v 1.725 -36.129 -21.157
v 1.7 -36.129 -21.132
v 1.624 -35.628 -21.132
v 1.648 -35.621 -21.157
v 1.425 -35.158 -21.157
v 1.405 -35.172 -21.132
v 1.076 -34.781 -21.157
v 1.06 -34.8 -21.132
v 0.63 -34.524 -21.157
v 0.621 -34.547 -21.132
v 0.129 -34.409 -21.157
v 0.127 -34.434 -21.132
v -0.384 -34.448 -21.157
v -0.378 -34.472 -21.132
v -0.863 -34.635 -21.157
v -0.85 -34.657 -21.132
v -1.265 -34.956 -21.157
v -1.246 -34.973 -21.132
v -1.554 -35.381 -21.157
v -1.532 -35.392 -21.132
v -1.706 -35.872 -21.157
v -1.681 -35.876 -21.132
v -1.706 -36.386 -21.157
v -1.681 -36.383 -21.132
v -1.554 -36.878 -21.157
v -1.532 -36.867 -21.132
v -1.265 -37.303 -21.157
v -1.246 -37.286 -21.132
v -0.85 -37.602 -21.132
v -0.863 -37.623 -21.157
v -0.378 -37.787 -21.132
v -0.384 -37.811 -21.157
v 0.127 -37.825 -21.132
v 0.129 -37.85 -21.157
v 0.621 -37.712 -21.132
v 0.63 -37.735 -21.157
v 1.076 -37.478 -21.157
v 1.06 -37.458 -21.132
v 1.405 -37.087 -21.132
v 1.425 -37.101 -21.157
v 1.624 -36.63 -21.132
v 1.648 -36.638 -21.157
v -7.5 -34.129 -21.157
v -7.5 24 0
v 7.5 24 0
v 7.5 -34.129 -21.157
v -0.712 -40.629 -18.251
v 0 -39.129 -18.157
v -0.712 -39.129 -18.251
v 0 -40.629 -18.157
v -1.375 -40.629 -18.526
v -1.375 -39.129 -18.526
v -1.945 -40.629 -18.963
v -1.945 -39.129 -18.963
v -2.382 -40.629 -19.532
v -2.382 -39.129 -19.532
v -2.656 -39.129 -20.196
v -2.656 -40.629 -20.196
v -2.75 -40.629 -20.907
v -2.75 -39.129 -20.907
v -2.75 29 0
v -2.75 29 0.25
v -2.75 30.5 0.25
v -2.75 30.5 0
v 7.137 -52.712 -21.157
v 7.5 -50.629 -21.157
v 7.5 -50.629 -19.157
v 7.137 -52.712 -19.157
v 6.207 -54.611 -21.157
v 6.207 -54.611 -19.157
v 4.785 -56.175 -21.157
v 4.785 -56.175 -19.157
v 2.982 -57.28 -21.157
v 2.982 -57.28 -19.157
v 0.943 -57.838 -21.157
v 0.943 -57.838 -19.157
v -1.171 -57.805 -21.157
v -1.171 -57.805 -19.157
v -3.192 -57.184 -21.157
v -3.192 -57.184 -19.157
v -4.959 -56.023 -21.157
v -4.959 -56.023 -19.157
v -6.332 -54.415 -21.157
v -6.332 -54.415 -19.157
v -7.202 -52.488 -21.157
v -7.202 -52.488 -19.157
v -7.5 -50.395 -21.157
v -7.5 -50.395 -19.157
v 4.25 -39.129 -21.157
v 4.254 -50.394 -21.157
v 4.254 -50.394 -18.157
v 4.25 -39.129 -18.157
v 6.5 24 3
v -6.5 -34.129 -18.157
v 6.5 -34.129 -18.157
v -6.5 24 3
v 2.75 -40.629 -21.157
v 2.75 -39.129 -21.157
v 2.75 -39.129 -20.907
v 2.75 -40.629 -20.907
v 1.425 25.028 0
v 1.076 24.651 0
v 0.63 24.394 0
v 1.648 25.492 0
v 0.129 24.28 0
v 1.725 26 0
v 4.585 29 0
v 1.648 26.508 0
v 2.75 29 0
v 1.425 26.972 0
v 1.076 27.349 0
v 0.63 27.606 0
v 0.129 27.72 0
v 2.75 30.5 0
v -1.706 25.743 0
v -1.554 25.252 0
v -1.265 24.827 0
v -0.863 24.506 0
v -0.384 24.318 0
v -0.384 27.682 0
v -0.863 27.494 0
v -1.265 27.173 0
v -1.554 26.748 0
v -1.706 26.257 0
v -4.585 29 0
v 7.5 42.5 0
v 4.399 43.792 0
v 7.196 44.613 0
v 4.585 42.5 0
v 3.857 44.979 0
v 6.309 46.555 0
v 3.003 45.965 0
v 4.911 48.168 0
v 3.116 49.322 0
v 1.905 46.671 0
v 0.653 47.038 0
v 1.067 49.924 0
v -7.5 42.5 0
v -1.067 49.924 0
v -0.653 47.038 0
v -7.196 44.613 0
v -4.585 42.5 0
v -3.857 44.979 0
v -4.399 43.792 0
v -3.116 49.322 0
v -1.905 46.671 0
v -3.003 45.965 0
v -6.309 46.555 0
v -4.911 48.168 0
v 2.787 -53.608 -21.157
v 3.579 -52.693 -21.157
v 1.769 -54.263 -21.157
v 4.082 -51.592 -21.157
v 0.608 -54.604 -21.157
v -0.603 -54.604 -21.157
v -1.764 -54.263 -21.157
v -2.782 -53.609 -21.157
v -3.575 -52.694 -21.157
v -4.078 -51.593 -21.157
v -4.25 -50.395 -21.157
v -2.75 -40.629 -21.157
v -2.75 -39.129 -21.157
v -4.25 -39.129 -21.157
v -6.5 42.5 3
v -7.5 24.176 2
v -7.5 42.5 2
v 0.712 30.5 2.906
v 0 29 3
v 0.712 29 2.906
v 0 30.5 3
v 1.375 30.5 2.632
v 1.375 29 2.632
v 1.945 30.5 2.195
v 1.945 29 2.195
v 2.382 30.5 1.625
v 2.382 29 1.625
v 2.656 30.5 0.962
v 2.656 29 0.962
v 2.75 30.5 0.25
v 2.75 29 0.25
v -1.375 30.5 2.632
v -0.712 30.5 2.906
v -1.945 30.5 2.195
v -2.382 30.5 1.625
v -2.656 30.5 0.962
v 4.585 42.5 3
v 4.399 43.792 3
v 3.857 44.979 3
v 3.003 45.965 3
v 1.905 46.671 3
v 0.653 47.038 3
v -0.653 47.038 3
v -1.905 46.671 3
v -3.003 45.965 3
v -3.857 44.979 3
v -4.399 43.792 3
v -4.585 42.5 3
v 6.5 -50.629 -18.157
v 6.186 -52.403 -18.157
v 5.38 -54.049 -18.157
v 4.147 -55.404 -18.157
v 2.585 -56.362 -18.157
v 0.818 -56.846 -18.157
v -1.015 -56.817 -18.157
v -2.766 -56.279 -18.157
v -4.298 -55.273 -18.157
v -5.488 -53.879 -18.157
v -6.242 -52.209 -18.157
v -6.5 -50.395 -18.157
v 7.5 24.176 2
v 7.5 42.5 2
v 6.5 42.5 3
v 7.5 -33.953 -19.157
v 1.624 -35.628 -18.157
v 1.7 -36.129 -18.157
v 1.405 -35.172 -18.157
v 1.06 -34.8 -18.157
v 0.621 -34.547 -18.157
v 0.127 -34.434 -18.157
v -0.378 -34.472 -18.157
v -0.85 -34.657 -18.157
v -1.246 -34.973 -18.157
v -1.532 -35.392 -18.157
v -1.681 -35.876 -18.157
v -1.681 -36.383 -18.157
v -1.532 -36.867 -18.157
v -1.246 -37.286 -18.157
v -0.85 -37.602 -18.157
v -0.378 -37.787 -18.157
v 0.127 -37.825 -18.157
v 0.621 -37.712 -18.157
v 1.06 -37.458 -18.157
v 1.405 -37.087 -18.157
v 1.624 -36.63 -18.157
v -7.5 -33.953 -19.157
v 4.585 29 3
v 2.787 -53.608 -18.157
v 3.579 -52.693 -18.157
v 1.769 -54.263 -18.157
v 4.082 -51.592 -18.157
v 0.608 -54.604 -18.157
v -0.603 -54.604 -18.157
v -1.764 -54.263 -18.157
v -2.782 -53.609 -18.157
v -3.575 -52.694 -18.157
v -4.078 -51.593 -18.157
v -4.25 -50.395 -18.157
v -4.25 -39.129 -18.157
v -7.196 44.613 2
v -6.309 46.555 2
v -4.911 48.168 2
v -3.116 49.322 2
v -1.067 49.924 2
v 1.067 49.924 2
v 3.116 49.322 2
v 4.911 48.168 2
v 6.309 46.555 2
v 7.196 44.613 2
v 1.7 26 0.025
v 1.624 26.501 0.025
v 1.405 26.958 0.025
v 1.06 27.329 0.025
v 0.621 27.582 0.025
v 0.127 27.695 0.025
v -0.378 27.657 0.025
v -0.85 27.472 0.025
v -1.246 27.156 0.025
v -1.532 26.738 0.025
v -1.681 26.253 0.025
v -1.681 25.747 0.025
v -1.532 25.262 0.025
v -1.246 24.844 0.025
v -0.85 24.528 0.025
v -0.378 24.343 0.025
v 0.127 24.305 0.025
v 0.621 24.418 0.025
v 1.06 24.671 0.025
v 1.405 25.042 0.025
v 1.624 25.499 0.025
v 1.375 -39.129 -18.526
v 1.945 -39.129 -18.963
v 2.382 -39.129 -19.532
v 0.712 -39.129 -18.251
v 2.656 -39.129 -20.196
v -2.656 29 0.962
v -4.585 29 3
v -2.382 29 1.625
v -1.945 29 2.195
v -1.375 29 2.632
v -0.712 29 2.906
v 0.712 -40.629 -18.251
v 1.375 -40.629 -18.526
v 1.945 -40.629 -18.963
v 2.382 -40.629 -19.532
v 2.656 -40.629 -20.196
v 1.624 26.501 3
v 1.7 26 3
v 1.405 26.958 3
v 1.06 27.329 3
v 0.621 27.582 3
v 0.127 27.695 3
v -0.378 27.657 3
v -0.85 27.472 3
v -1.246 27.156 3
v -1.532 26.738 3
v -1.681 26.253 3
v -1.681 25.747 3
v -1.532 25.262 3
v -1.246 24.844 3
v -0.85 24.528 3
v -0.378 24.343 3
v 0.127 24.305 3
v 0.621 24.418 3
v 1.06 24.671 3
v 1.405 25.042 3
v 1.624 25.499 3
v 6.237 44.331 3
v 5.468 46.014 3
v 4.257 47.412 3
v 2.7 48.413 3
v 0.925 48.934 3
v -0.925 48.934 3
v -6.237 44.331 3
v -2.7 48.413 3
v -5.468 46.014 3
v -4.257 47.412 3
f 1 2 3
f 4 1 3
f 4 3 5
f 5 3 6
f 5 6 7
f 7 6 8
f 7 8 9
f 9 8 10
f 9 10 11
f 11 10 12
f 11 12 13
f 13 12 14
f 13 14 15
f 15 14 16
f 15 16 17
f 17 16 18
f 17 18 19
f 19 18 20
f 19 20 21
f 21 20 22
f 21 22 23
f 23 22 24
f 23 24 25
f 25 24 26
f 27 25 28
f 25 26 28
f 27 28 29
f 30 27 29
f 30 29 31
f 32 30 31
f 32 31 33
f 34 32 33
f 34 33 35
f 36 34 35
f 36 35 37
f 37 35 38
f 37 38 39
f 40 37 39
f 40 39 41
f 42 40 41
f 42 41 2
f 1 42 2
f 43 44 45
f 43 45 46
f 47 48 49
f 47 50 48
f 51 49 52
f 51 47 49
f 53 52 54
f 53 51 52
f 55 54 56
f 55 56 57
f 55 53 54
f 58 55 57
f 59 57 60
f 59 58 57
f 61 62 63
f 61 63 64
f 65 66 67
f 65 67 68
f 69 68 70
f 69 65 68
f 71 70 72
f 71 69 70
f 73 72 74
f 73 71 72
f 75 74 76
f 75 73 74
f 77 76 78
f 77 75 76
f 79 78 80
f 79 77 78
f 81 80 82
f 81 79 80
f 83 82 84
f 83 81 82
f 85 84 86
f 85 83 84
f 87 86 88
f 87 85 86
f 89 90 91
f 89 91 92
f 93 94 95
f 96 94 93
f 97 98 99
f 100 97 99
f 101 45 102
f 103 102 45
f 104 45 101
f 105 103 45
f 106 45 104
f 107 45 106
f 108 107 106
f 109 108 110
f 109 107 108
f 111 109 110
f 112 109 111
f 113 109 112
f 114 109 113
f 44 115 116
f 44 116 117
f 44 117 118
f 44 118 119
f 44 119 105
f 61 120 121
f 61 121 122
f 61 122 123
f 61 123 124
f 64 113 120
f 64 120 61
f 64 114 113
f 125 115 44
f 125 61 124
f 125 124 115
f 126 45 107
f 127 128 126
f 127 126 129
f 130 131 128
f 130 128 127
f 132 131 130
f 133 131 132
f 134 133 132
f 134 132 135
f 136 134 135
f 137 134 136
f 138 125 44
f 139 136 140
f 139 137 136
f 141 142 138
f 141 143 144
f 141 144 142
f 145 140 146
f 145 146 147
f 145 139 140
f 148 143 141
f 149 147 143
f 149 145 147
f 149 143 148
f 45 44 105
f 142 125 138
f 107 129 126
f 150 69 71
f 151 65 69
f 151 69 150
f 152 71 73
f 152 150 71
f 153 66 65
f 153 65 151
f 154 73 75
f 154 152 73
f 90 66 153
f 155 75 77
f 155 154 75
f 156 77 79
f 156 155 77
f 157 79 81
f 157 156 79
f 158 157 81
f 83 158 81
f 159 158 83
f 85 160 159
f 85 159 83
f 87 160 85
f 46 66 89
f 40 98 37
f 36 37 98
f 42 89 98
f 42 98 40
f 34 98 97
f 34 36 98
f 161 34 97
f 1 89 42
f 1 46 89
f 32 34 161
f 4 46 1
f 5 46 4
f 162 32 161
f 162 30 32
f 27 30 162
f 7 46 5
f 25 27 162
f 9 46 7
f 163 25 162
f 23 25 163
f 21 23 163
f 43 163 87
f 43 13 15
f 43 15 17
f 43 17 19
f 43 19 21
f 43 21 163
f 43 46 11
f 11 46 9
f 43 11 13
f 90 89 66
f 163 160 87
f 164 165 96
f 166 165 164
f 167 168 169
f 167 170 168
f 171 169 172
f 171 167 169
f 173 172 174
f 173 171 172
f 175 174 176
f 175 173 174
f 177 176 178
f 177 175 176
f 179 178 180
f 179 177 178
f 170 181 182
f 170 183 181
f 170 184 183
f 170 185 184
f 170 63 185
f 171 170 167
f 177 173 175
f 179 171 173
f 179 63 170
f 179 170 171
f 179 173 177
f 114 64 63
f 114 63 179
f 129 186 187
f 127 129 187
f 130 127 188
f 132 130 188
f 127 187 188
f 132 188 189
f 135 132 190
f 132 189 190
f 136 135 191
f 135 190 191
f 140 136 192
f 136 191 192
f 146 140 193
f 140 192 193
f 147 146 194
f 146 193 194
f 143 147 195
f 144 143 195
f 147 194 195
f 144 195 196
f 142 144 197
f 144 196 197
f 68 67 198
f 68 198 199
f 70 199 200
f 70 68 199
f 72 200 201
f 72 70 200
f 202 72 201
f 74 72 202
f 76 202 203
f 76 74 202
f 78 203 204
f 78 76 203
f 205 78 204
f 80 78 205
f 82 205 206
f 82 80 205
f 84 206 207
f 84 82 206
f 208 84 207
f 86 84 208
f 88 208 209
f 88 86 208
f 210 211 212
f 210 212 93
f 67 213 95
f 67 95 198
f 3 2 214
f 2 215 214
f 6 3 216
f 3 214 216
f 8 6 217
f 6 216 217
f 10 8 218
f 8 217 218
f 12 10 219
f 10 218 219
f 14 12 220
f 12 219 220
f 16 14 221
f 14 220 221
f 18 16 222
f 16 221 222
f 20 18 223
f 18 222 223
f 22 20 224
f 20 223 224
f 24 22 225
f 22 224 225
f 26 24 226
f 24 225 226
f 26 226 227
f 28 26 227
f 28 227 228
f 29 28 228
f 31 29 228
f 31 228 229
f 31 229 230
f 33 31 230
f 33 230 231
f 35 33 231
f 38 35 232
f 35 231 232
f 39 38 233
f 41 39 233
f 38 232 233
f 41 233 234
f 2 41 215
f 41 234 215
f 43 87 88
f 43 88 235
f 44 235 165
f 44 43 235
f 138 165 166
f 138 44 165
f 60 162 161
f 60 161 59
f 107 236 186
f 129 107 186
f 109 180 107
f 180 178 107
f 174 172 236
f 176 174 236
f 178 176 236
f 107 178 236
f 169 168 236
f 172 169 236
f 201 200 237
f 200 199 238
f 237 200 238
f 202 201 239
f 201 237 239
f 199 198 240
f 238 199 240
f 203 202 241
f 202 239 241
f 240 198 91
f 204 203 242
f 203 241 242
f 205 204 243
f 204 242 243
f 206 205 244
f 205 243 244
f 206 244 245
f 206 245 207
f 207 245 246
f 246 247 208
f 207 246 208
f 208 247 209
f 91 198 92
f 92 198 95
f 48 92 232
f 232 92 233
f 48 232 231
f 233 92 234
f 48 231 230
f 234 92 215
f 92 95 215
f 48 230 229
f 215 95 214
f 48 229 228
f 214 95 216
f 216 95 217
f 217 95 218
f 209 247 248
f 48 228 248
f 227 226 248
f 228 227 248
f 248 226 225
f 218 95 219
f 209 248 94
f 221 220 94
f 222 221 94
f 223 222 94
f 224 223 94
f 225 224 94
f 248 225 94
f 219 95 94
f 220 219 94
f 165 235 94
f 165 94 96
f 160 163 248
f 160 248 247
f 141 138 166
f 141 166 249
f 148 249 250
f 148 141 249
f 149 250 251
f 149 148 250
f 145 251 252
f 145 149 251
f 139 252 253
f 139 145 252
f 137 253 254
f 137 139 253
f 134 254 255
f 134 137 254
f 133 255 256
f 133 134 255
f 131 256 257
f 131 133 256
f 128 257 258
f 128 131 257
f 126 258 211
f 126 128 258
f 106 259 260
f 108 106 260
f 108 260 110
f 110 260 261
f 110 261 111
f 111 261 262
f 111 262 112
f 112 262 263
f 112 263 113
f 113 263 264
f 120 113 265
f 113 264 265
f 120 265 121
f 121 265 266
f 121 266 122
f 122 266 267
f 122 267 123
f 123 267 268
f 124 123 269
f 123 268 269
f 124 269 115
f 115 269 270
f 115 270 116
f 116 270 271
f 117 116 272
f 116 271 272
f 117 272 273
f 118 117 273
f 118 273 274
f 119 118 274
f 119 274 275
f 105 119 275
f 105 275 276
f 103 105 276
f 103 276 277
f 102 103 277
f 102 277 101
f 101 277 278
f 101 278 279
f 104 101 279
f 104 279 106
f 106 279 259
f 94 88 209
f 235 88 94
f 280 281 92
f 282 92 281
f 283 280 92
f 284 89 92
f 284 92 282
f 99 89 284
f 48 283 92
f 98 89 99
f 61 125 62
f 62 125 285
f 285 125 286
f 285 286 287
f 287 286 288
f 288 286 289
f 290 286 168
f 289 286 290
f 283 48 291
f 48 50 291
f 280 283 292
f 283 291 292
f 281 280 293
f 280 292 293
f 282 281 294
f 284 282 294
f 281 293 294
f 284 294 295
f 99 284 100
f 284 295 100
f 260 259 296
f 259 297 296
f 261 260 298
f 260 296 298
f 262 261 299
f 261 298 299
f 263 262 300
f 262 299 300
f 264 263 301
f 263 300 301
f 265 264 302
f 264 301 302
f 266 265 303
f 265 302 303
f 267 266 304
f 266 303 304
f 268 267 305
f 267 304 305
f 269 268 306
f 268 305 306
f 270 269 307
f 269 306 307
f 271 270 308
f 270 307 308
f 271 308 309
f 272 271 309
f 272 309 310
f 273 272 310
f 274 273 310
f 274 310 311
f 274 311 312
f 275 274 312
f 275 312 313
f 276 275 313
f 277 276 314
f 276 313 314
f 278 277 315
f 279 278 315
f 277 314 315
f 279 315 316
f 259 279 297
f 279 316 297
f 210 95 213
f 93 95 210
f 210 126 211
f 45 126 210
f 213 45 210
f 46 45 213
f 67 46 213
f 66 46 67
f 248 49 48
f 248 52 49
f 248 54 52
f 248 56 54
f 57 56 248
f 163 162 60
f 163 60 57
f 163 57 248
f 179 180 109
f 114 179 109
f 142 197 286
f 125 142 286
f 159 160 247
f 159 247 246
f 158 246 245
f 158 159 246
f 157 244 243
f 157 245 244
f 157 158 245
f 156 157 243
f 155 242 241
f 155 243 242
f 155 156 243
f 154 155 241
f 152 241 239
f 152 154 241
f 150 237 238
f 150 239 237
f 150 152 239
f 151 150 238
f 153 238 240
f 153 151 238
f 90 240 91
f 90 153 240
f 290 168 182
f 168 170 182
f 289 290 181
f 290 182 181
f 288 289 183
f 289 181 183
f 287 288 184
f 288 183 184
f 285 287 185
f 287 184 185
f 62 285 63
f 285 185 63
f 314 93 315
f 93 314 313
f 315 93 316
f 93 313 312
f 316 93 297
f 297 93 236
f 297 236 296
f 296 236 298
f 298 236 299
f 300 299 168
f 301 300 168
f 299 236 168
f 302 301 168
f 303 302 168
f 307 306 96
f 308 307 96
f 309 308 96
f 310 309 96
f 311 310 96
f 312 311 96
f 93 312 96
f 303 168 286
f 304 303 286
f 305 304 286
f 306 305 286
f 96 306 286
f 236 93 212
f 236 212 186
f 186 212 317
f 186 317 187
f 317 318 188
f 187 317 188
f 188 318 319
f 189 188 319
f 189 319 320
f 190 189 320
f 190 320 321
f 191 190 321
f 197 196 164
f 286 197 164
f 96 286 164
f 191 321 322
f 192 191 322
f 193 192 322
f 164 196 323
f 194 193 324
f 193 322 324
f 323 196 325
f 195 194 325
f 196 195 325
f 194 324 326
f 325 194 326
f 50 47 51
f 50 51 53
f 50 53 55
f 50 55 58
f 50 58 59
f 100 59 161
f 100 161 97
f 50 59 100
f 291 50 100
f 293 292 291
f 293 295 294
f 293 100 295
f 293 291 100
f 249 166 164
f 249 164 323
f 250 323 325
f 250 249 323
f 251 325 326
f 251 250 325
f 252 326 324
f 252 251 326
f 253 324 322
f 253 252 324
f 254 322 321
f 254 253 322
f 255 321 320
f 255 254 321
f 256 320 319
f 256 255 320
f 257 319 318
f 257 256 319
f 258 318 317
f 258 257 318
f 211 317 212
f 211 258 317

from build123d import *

# Parameters (mm, degrees)
BOSS_EXTRUDE1_DEPTH            = 3
CUT_EXTRUDE1_REACH             = 52.648
SKETCH3_W                      = 5.5
SKETCH3_H                      = 3
BOSS_EXTRUDE2_DEPTH            = 1.5
CUT_EXTRUDE2_REACH             = 52.648
SKETCH4_W                      = 6.851042423
SKETCH4_H                      = 79.503772781
CUT_EXTRUDE2_DIRECTION_2_REACH = 52.648
BOSS_EXTRUDE3_DEPTH            = 7.5
BOSS_EXTRUDE3_DEPTH_BACK       = 7.5
BOSS_EXTRUDE5_DEPTH            = 3
CUT_EXTRUDE3_REACH             = 65.182
SKETCH10_W                     = 5.5
SKETCH10_H                     = 3
BOSS_EXTRUDE6_DEPTH            = 1.5
FILLET2_R                      = 2.75
M3_CLEARANCE_HOLE1_D           = 3.4
M3_CLEARANCE_HOLE1_CSINK_D     = 3.45
M3_CLEARANCE_HOLE1_CSINK_ANGLE = 90
M3_CLEARANCE_HOLE2_D           = 3.4
M3_CLEARANCE_HOLE2_CSINK_D     = 3.45
M3_CLEARANCE_HOLE2_CSINK_ANGLE = 90
CHAMFER2_SIZE                  = 1


with BuildPart() as part:
    # Sketch1 → Boss-Extrude1 (new body)
    with BuildSketch(Plane.XY):
        with BuildLine():
            Line((7.5, 42.5), (7.5, -42.5))
            ThreePointArc((7.5, -42.5), (0, -50), (-7.5, -42.5))
            Line((-7.5, -42.5), (-7.5, 42.5))
            ThreePointArc((-7.5, 42.5), (0, 50), (7.5, 42.5))
        make_face()
    extrude(amount=BOSS_EXTRUDE1_DEPTH)

    # Sketch2 → Cut-Extrude1 (cut, up to next)
    with BuildSketch(Plane.XY.offset(3), mode=Mode.PRIVATE) as cut_extrude1_sk1:
        with BuildLine():
            Line((-4.585044143, 42.5), (-4.585044143, 29))
            Line((-4.585044143, 29), (4.585044143, 29))
            Line((4.585044143, 29), (4.585044143, 42.5))
            ThreePointArc((4.585044143, 42.5), (0, 47.085044143), (-4.585044143, 42.5))
        make_face()
    cut_extrude1_tool1 = extrude(cut_extrude1_sk1.sketch, amount=-CUT_EXTRUDE1_REACH, mode=Mode.PRIVATE) & part.part
    cut_extrude1 = cut_extrude1_tool1.solids().sort_by_distance((0, 37.581163, 3))[0]
    add(cut_extrude1, mode=Mode.SUBTRACT)

    # Sketch3 → Boss-Extrude2 (add)
    with BuildSketch(Plane(origin=(0, 29, 0), x_dir=(1, 0, 0), z_dir=(0, 1, 0))):
        with Locations((0, -1.5)):
            Rectangle(SKETCH3_W, SKETCH3_H)
    boss_extrude2 = extrude(amount=BOSS_EXTRUDE2_DEPTH)

    # Mirror1: Cut-Extrude1, Boss-Extrude2 across plane
    add(cut_extrude1.mirror(Plane.ZX), mode=Mode.SUBTRACT)
    add(boss_extrude2.mirror(Plane.ZX))

    # Sketch4 → Cut-Extrude2 (cut, up to next)
    with BuildSketch(Plane(origin=(0, 0, 0), x_dir=(0, 0, -1), z_dir=(1, 0, 0)), mode=Mode.PRIVATE) as cut_extrude2_sk1:
        with Locations((-3.425521211, -15.751886391)):
            Rectangle(SKETCH4_W, SKETCH4_H)
    cut_extrude2_tool1 = extrude(cut_extrude2_sk1.sketch, amount=-CUT_EXTRUDE2_REACH, mode=Mode.PRIVATE) & part.part
    add(cut_extrude2_tool1.solids().sort_by_distance((0, -15.751886, 3.425521))[0], mode=Mode.SUBTRACT)

    # Sketch4 → Cut-Extrude2 direction 2 (cut, up to next)
    with BuildSketch(Plane(origin=(0, 0, 0), x_dir=(0, 0, -1), z_dir=(1, 0, 0)), mode=Mode.PRIVATE) as cut_extrude2_direction_2_sk1:
        with Locations((-3.425521211, -15.751886391)):
            Rectangle(SKETCH4_W, SKETCH4_H)
    cut_extrude2_direction_2_tool1 = extrude(cut_extrude2_direction_2_sk1.sketch, amount=CUT_EXTRUDE2_DIRECTION_2_REACH, mode=Mode.PRIVATE) & part.part
    add(cut_extrude2_direction_2_tool1.solids().sort_by_distance((0, -15.751886, 3.425521))[0], mode=Mode.SUBTRACT)

    # Sketch5 → Boss-Extrude3 (add, two sides: drawn at the far end of the back side and taken through both)
    with BuildSketch(Plane(origin=(0, 0, 0), x_dir=(0, 0, -1), z_dir=(1, 0, 0)).offset(-BOSS_EXTRUDE3_DEPTH_BACK)):
        Polygon((0, 24), (21.157354182, -34.12935287), (18.157354182, -34.12935287), (-3, 24), align=None)
    extrude(amount=BOSS_EXTRUDE3_DEPTH + BOSS_EXTRUDE3_DEPTH_BACK)

    # Sketch7 → Boss-Extrude5 (add)
    with BuildSketch(Plane.XY.offset(-21.157354182)):
        with BuildLine():
            Line((7.5, -34.12935287), (7.5, -50.62935287))
            ThreePointArc((7.5, -50.62935287), (-0.115167499, -57.896309511), (-7.5, -50.395397313))
            Line((-7.5, -50.395397313), (-7.5, -34.12935287))
            Line((-7.5, -34.12935287), (7.5, -34.12935287))
        make_face()
    extrude(amount=BOSS_EXTRUDE5_DEPTH)

    # Sketch9 → Cut-Extrude3 (cut, up to next)
    with BuildSketch(Plane(origin=(0, 0, -21.157354182), x_dir=(-1, 0, 0), z_dir=(0, 0, -1)), mode=Mode.PRIVATE) as cut_extrude3_sk1:
        with BuildLine():
            Line((-4.25, -39.12935287), (4.25, -39.12935287))
            Line((4.25, -39.12935287), (4.25, -50.395397313))
            ThreePointArc((4.25, -50.395397313), (-0.002513121, -54.647221764), (-4.25364879, -50.394020085))
            Line((-4.25364879, -50.394020085), (-4.25, -39.12935287))
        make_face()
    cut_extrude3_tool1 = extrude(cut_extrude3_sk1.sketch, amount=-CUT_EXTRUDE3_REACH, mode=Mode.PRIVATE) & part.part
    add(cut_extrude3_tool1.solids().sort_by_distance((0.001121, -46.463485, -21.157354))[0], mode=Mode.SUBTRACT)

    # Sketch10 → Boss-Extrude6 (add)
    with BuildSketch(Plane.XZ.offset(39.12935287)):
        with Locations((0, -19.657354182)):
            Rectangle(SKETCH10_W, SKETCH10_H)
    extrude(amount=BOSS_EXTRUDE6_DEPTH)

    # Fillet2
    fillet2_edges = [part.edges().sort_by_distance(p)[0] for p in [
        (2.75, -39.87935287, -18.157354182),
        (-2.75, -39.87935287, -18.157354182),
        (-2.75, 29.75, 3),
        (2.75, 29.75, 3),
    ]]
    fillet(fillet2_edges, radius=FILLET2_R - 0.0001)  # a hair under: the kernel refuses the full size

    # M3 Clearance Hole1 (through all)
    with Locations(Plane(origin=(0, 0, 0), x_dir=(-1, 0, 0), z_dir=(0, 0, -1))):
        with Locations((0, 26)):
            CounterSinkHole(M3_CLEARANCE_HOLE1_D / 2, M3_CLEARANCE_HOLE1_CSINK_D / 2, counter_sink_angle=M3_CLEARANCE_HOLE1_CSINK_ANGLE)

    # M3 Clearance Hole2 (through all)
    with Locations(Plane(origin=(0, 0, -21.157354182), x_dir=(-1, 0, 0), z_dir=(0, 0, -1))):
        with Locations((0, -36.12935287)):
            CounterSinkHole(M3_CLEARANCE_HOLE2_D / 2, M3_CLEARANCE_HOLE2_CSINK_D / 2, counter_sink_angle=M3_CLEARANCE_HOLE2_CSINK_ANGLE)

    # Chamfer2
    chamfer2_edges = [part.edges().sort_by_distance(p)[0] for p in [
        (7.5, -5.064676435, -7.578677091),
        (-7.5, -5.064676435, -7.578677091),
        (-7.5, -42.262375091, -18.157354182),
        (-0.115167499, -57.896309511, -18.157354182),
        (7.5, -42.37935287, -18.157354182),
        (0, 50, 3),
        (7.5, 33.25, 3),
        (-7.5, 33.25, 3),
    ]]
    chamfer(chamfer2_edges, length=CHAMFER2_SIZE)


solid = part.part
